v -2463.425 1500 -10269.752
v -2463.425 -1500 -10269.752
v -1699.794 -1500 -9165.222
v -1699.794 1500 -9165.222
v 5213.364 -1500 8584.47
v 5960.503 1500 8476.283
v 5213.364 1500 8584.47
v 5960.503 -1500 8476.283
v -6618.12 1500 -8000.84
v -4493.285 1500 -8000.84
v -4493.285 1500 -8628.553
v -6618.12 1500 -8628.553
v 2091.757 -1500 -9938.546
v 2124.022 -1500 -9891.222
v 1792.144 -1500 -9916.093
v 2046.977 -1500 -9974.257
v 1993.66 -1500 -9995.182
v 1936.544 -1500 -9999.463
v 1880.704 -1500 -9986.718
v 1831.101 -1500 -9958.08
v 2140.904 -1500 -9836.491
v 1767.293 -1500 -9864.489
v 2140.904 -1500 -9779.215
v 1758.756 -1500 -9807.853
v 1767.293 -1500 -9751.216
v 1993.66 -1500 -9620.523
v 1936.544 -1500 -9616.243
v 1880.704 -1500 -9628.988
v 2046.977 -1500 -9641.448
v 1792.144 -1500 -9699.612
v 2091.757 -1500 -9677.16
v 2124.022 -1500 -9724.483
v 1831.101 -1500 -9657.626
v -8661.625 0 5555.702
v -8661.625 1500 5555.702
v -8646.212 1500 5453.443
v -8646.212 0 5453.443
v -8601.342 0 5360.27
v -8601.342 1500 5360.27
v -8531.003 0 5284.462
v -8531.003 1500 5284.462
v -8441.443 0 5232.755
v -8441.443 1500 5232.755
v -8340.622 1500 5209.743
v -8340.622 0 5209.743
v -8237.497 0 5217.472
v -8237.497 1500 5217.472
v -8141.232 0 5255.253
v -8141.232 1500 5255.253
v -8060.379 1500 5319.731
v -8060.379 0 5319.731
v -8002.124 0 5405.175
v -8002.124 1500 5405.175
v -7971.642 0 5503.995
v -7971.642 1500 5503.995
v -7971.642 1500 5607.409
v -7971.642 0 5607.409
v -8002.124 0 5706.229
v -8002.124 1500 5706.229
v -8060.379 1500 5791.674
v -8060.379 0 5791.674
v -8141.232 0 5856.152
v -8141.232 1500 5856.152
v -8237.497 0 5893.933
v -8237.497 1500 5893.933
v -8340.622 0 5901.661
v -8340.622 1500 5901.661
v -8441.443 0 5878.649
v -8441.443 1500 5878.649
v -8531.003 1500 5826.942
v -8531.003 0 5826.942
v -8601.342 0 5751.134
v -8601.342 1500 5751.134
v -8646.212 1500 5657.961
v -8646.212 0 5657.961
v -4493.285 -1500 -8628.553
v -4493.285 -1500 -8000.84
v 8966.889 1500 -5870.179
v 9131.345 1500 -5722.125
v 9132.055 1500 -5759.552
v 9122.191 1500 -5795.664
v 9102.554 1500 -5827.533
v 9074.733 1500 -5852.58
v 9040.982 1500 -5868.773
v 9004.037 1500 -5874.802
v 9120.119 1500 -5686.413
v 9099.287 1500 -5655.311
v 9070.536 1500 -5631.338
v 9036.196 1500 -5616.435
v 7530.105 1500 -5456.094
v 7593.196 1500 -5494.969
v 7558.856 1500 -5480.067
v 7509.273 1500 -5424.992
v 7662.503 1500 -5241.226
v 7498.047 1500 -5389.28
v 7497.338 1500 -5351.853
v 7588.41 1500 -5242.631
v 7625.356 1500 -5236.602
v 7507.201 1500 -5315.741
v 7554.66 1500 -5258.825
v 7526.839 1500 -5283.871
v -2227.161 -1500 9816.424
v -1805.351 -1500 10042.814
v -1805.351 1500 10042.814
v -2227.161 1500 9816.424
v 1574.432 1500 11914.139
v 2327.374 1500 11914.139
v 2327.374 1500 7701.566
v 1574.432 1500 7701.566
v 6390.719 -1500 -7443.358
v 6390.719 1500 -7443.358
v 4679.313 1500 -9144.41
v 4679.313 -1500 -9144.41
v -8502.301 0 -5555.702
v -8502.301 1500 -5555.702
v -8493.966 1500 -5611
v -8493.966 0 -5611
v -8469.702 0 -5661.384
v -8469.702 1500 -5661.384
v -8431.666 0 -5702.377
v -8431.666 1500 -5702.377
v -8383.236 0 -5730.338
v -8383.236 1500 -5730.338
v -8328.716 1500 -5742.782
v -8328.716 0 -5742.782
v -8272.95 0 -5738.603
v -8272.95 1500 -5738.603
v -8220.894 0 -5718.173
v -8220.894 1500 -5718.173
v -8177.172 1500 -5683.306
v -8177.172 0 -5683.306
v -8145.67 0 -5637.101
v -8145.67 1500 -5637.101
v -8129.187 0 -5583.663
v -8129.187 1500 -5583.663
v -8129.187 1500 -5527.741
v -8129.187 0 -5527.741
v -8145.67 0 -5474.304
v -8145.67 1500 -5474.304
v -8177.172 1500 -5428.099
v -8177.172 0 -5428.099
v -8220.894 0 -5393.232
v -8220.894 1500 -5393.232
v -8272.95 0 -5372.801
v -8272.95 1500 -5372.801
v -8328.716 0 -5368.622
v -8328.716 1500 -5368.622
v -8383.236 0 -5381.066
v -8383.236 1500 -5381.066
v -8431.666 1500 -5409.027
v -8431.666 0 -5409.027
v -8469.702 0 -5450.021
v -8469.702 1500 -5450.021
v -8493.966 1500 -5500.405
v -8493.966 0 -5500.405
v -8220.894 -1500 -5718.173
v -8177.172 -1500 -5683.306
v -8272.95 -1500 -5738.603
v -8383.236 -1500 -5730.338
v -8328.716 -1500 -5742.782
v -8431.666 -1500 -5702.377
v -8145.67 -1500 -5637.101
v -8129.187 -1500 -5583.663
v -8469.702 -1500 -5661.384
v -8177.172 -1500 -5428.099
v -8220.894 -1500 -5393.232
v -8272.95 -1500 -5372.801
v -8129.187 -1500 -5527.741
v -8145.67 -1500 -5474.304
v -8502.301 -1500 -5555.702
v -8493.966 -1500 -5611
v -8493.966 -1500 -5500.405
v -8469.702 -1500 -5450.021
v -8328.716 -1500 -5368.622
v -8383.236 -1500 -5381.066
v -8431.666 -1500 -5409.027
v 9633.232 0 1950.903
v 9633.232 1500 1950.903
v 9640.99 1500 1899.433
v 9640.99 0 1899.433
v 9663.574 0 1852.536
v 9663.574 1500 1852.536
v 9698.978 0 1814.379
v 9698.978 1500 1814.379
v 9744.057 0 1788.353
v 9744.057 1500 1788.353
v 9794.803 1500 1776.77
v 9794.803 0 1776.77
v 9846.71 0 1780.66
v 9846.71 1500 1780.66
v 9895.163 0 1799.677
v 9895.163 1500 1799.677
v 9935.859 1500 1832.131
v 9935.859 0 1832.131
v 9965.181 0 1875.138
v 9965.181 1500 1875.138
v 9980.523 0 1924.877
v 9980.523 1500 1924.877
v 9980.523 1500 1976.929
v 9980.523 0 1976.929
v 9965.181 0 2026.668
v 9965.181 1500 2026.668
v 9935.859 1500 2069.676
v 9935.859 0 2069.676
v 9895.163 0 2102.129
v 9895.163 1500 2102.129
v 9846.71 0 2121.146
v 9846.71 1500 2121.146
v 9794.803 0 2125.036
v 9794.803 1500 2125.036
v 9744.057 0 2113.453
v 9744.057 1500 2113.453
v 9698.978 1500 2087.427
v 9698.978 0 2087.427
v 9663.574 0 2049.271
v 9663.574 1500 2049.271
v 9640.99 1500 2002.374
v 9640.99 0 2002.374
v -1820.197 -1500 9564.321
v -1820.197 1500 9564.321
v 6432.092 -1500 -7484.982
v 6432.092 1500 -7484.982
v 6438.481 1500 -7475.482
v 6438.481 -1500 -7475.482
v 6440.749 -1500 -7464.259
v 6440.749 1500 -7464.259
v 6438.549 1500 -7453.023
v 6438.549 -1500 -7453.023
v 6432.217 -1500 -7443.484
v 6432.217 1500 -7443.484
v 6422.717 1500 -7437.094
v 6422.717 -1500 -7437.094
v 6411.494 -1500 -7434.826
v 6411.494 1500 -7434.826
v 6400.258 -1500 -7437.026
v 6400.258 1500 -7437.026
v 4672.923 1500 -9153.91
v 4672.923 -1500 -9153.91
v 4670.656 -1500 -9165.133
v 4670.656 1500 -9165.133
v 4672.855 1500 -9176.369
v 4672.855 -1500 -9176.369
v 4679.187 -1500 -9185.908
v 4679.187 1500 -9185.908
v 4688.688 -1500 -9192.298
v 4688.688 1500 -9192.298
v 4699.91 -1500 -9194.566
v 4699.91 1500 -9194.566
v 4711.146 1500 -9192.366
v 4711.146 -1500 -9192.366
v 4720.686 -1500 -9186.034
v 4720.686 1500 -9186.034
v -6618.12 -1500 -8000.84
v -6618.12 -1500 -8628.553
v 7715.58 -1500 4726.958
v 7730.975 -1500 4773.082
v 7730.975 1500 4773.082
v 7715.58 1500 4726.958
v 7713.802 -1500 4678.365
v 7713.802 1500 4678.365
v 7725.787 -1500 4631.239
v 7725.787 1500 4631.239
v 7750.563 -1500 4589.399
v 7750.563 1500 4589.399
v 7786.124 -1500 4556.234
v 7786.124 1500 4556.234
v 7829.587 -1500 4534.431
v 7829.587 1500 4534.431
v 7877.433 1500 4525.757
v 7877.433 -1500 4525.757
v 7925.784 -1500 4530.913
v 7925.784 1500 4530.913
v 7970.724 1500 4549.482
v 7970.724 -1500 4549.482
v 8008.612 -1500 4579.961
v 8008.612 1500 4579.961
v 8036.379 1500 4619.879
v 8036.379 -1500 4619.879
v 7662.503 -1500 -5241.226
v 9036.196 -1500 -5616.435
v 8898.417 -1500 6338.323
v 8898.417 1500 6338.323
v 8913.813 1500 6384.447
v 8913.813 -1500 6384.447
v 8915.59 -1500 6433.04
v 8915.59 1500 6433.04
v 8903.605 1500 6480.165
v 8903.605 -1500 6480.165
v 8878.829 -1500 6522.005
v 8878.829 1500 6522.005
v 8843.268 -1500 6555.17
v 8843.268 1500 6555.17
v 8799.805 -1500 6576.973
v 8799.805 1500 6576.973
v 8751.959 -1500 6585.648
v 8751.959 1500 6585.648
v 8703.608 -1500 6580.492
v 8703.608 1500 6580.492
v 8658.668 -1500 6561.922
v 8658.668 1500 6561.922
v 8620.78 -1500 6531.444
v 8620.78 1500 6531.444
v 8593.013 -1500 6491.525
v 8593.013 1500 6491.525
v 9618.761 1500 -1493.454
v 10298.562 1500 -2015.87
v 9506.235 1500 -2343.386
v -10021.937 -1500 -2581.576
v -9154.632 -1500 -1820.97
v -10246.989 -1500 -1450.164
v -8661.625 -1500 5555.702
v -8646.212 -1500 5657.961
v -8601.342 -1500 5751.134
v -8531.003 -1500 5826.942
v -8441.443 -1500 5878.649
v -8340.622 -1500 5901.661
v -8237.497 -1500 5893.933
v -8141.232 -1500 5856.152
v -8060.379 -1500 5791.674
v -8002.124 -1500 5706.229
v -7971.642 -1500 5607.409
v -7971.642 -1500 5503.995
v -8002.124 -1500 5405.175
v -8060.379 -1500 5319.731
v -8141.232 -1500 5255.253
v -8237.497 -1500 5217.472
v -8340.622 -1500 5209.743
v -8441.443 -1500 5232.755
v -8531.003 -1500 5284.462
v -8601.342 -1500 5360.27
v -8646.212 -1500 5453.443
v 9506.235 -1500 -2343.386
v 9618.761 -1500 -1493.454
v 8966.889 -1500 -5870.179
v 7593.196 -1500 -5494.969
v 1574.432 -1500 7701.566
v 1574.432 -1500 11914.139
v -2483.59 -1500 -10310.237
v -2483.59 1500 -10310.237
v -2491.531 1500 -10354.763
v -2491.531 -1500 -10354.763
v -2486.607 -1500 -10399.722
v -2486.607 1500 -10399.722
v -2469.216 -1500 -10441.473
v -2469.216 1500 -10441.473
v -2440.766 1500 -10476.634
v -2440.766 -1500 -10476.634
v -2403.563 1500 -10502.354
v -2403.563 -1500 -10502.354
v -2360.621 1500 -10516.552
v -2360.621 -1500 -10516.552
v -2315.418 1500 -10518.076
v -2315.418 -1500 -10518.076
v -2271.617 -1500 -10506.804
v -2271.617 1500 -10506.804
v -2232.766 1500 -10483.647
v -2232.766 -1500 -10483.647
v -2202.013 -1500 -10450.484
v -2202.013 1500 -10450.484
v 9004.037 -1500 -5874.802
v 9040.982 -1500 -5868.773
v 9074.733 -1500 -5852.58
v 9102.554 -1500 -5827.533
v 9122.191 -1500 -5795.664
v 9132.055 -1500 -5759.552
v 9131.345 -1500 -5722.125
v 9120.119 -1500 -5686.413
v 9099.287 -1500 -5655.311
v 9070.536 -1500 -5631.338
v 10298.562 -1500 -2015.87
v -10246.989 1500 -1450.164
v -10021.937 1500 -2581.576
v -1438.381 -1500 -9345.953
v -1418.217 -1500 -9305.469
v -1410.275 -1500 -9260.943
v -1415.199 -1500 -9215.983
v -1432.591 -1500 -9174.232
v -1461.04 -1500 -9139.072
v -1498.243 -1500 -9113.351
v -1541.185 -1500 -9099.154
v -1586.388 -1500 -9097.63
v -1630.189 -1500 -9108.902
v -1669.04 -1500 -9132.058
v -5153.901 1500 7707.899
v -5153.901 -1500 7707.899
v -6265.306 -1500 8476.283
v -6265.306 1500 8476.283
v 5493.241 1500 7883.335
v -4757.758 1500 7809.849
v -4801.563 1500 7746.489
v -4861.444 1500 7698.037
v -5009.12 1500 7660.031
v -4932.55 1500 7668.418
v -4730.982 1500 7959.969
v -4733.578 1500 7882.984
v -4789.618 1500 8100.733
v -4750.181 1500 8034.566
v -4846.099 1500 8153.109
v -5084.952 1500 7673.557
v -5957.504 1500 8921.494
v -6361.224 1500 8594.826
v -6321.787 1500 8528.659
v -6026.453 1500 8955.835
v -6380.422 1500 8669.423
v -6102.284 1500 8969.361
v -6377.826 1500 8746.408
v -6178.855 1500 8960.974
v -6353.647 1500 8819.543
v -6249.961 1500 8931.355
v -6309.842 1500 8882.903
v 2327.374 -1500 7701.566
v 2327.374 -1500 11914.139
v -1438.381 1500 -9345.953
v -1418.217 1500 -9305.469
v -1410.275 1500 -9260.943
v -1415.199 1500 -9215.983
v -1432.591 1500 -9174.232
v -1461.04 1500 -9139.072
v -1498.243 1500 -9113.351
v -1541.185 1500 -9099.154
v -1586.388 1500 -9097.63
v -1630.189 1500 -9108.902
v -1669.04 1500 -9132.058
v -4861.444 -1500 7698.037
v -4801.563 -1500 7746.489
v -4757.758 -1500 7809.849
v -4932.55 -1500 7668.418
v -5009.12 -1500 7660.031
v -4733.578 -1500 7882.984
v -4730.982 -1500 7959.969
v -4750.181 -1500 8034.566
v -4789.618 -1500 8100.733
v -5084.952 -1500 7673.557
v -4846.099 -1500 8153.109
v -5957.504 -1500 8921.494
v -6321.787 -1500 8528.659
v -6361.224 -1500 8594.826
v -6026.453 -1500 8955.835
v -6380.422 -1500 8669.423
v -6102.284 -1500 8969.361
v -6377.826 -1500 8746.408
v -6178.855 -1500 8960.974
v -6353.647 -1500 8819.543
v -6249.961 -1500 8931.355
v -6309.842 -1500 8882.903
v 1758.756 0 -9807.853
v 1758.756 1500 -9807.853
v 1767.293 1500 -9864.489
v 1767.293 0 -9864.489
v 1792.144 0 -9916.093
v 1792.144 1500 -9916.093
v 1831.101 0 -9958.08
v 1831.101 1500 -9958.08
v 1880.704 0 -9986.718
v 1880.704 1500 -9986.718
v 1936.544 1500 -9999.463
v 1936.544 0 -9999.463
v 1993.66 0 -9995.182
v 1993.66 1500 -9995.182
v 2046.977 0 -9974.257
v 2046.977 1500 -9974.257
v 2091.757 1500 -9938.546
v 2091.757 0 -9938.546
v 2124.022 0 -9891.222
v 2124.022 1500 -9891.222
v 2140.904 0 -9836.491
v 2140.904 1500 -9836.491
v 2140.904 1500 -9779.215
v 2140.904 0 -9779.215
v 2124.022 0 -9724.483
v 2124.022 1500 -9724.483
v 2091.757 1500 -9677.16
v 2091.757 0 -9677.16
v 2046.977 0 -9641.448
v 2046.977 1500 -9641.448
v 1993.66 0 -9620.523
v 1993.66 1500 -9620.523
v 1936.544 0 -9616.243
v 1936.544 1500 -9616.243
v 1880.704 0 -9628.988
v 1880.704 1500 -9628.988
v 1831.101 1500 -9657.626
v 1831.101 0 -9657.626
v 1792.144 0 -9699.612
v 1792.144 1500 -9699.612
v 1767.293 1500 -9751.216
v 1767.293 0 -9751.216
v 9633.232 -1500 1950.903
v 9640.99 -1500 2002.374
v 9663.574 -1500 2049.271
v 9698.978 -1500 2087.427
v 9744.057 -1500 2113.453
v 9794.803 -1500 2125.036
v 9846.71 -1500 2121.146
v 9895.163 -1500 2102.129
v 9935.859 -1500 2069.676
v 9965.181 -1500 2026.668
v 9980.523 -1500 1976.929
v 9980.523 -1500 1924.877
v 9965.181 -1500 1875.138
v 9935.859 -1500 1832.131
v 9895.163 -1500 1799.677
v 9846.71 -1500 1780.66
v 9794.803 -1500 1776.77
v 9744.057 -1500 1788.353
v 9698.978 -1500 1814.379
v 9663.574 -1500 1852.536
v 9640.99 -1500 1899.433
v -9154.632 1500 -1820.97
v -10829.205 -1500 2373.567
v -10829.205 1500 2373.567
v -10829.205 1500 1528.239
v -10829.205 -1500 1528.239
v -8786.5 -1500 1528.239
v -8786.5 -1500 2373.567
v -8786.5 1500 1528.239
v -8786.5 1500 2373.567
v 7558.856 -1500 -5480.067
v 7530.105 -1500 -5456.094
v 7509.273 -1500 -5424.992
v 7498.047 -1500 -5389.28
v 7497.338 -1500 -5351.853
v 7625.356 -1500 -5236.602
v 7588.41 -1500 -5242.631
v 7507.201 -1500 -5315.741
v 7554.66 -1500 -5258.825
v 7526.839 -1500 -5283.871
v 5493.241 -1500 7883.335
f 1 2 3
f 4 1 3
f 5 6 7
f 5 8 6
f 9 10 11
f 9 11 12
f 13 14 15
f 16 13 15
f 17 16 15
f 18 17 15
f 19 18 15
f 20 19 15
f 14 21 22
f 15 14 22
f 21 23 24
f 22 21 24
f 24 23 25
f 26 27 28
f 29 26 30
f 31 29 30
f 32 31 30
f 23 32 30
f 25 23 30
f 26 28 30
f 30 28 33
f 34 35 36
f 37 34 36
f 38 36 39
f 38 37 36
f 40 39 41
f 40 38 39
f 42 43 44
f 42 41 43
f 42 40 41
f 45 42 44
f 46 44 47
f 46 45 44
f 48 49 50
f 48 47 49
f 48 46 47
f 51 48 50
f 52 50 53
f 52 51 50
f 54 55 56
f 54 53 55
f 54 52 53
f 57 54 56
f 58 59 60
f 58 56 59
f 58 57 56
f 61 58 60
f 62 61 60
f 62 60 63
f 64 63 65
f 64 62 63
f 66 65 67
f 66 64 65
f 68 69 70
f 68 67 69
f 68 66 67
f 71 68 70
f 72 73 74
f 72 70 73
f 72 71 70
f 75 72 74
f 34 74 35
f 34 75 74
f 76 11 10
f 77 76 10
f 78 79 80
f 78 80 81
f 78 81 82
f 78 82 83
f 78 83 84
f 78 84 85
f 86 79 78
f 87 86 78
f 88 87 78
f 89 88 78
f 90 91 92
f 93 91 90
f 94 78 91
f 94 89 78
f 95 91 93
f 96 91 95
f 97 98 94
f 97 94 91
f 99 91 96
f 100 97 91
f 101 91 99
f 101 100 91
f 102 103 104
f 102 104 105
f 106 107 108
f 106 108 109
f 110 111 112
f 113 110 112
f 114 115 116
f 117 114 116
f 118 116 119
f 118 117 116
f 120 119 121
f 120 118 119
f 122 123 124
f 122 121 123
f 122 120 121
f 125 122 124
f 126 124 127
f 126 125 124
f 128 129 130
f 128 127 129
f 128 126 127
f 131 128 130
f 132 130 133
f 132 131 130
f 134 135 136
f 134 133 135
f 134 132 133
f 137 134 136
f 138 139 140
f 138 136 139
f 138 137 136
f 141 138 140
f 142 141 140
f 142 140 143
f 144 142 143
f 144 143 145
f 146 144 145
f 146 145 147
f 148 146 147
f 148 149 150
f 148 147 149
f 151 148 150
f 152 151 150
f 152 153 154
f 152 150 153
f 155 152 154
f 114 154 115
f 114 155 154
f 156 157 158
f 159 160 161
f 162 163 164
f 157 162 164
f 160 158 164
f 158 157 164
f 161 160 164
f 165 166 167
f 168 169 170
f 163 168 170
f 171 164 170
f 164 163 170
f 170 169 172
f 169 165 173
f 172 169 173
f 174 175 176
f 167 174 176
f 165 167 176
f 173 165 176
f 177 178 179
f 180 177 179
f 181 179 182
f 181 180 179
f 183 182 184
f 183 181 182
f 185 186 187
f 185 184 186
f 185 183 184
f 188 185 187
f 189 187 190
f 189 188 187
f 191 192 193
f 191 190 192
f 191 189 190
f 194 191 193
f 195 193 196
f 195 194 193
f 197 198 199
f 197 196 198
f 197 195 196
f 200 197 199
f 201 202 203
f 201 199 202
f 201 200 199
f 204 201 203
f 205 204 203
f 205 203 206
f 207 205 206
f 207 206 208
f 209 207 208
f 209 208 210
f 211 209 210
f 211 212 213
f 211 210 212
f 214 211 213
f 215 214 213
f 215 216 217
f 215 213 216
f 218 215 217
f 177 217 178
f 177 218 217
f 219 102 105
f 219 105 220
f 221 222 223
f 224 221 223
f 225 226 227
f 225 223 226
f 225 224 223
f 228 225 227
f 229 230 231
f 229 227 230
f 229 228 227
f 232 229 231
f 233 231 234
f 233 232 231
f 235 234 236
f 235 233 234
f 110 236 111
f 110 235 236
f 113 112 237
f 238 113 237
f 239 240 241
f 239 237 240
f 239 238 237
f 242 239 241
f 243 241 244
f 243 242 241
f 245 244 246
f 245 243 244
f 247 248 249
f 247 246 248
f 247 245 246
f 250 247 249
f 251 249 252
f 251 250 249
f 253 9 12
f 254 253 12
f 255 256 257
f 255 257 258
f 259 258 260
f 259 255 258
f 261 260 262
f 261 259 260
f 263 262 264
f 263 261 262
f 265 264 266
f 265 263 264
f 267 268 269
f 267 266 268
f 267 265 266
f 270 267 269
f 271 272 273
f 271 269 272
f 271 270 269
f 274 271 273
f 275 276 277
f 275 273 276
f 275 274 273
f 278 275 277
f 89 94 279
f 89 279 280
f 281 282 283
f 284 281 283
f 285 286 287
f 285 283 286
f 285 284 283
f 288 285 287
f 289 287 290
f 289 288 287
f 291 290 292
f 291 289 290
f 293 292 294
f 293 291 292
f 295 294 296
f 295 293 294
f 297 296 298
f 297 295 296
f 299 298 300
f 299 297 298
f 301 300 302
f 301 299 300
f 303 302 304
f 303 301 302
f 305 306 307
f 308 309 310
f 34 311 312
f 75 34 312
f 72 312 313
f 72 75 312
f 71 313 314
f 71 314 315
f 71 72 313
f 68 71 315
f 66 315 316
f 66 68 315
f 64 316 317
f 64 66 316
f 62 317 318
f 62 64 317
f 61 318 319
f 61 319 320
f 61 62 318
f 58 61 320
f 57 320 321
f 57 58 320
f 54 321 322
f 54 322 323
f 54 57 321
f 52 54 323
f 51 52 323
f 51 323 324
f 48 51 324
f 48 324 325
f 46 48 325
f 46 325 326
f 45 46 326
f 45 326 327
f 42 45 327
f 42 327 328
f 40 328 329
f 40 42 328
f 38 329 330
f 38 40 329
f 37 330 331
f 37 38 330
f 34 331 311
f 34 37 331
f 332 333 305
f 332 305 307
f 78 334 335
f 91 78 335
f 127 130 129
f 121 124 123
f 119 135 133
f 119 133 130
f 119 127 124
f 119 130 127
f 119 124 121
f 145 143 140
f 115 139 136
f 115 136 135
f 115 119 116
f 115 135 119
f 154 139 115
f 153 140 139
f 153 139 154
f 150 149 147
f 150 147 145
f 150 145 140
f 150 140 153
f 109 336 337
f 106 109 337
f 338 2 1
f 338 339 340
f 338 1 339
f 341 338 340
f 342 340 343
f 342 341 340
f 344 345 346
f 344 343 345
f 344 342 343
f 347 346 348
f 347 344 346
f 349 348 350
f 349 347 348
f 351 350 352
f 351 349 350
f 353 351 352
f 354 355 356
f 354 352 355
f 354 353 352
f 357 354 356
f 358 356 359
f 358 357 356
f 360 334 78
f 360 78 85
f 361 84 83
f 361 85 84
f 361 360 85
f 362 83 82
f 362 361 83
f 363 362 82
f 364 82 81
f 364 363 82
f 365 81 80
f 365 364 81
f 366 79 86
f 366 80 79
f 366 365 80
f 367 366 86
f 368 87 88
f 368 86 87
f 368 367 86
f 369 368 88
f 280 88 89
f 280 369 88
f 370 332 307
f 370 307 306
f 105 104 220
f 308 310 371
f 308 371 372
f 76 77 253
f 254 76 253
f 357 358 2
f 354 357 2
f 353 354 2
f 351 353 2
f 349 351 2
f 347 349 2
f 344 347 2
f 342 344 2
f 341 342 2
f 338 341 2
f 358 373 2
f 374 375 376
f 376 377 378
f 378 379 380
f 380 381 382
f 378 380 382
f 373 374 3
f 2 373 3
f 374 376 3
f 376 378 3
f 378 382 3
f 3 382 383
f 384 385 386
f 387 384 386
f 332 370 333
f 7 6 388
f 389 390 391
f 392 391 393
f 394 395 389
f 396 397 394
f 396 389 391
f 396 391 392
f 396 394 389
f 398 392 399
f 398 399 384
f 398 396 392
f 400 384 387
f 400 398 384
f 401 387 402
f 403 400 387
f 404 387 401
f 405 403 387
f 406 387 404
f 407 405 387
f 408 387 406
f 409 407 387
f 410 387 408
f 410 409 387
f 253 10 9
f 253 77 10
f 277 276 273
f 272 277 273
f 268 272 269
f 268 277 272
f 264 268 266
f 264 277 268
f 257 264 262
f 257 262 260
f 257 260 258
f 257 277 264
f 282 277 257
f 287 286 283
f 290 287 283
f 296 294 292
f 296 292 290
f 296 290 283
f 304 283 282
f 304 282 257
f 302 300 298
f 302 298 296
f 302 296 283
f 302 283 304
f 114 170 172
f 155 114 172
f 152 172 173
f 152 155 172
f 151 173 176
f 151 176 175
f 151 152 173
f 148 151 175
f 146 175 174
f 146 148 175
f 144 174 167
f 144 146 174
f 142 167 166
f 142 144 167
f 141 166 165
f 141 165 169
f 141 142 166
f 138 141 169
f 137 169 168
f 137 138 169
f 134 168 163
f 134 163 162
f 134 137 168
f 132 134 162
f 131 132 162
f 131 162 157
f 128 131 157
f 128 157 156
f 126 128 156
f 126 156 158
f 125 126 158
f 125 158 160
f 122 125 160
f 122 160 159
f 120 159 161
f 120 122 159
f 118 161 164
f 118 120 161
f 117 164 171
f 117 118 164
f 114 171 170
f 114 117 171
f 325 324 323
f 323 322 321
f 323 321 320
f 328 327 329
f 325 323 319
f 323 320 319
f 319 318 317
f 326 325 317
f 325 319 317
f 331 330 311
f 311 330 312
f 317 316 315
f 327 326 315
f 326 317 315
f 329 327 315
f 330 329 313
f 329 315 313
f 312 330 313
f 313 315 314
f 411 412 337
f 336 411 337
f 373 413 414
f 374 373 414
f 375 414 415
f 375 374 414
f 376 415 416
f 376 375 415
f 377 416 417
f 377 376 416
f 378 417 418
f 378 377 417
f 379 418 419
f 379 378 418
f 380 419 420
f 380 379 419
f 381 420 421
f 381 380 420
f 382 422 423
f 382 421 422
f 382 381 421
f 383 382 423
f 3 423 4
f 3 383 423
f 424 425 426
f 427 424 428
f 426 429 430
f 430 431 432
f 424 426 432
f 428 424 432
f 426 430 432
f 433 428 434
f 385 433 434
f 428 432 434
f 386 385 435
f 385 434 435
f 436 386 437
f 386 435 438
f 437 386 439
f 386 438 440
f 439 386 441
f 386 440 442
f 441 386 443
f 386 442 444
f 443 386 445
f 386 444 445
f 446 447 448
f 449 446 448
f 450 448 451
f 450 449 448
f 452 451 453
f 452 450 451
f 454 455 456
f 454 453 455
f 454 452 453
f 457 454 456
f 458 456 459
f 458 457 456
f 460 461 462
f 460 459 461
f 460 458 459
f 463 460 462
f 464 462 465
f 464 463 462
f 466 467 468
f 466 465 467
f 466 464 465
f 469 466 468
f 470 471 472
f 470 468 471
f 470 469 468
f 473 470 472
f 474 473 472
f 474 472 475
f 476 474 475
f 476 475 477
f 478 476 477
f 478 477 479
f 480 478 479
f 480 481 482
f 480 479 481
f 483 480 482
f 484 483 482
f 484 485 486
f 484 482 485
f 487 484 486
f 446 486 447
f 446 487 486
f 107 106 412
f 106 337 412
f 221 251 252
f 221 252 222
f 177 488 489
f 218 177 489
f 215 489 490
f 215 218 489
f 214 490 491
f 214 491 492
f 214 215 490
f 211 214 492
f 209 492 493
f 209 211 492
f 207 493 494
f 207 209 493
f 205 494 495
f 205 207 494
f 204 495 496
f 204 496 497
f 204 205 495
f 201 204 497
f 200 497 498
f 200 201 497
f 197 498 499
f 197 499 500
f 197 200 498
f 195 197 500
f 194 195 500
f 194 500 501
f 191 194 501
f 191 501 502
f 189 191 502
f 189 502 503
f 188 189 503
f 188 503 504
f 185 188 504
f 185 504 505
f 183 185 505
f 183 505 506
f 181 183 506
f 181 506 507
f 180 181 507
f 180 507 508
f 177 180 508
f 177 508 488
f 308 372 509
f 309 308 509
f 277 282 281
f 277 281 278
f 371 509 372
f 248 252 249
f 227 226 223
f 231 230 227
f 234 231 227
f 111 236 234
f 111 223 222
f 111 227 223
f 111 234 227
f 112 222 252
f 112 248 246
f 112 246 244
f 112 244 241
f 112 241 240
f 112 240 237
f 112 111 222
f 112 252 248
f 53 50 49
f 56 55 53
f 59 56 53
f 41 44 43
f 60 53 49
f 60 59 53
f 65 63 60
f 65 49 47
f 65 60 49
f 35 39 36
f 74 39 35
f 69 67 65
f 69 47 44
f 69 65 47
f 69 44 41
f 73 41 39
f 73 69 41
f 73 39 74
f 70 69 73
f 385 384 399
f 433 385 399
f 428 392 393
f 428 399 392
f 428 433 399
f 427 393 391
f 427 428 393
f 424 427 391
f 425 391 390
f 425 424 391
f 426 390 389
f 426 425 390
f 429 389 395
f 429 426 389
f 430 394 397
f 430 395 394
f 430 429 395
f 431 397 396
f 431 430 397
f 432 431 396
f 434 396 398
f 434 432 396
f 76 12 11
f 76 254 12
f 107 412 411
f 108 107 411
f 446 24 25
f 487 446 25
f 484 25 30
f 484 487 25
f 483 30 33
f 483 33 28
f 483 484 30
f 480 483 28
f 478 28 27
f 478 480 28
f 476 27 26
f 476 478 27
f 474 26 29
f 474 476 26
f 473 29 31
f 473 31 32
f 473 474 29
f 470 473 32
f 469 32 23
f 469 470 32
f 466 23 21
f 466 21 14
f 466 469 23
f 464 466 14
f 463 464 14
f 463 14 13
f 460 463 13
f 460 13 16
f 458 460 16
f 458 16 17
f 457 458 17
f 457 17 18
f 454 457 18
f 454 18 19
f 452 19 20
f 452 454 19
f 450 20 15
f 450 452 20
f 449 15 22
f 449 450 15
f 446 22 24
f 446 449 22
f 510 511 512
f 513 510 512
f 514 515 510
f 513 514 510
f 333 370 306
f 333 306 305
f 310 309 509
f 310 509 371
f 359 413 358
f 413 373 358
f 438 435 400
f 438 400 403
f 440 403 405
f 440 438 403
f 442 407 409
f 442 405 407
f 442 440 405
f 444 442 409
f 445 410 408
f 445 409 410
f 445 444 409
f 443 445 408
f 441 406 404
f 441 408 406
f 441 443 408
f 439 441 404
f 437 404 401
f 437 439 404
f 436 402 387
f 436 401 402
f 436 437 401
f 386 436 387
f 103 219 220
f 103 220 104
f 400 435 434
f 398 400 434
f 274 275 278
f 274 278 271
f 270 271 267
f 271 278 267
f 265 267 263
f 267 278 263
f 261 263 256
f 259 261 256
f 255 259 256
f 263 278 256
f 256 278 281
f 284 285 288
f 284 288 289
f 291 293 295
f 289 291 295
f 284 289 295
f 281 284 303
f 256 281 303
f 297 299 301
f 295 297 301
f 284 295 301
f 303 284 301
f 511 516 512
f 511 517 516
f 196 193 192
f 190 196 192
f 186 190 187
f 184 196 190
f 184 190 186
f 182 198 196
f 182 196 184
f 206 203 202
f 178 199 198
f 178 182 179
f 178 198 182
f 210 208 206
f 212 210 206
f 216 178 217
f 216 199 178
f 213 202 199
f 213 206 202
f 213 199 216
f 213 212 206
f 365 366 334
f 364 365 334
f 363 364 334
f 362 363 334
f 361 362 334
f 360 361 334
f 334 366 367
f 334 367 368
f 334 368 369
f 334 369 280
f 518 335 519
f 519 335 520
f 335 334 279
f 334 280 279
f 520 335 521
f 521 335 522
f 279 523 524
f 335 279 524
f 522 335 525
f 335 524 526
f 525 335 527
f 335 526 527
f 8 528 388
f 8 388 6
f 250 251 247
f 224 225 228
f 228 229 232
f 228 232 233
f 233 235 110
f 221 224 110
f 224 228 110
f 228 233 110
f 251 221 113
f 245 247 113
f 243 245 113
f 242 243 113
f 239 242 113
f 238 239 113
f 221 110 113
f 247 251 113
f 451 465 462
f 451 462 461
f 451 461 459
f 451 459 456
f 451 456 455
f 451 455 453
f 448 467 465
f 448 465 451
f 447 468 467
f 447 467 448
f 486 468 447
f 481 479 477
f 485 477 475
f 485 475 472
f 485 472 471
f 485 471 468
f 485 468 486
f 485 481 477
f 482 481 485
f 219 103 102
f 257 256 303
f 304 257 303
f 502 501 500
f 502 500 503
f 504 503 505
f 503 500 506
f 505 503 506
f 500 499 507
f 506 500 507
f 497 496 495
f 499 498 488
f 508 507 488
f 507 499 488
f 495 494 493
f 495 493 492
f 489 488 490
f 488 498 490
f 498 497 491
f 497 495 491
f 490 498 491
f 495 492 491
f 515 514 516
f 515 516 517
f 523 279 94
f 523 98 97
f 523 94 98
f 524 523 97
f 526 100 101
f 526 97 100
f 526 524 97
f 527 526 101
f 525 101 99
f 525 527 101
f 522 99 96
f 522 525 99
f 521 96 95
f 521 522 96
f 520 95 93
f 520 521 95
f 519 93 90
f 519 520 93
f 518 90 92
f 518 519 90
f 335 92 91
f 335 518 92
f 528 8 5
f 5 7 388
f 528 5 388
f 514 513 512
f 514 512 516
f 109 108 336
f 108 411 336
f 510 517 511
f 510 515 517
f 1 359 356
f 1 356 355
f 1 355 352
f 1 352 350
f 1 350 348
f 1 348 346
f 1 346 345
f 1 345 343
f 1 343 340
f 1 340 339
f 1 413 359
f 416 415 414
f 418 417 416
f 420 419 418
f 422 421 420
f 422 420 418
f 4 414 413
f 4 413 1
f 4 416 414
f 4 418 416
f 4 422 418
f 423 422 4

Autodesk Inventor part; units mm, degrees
ref_plane "YZ Plane" through (0, 0, 0) normal (1, 0, 0) x (0, 1, 0)
ref_plane "XZ Plane" through (0, 0, 0) normal (0, 1, 0) x (-1, 0, 0)
ref_plane "XY Plane" through (0, 0, 0) normal (0, 0, 1) x (1, 0, 0)
sketch "Sketch1" plane through (0, 0, 0) normal (0, 1, 0) x (-1, 0, 0)
  circle A0 centre (0, 0) radius 10000 construction
  line L0 (0, 0) -> (10000, 0)
  line L1 (0, 0) -> (9807.8528, -1950.9032) construction
  circle A1 centre (8314.6961, 5555.7023) radius 346.929
  circle A2 centre (8314.6961, -5555.7023) radius 187.6046
  circle A3 centre (-9807.8528, 1950.9032) radius 174.621
  circle A4 centre (-1950.9032, -9807.8528) radius 192.1472
  line L2 (10829.2054, 1528.2394) -> (8786.5002, 1528.2394)
  line L3 (8786.5002, 1528.2394) -> (8786.5002, 2373.5671)
  line L4 (8786.5002, 2373.5671) -> (10829.2054, 2373.5671)
  line L5 (10829.2054, 2373.5671) -> (10829.2054, 1528.2394)
  line L6 (10829.2054, 1528.2394) -> (8786.5002, 2373.5671) construction
  line L7 (8786.5002, 1528.2394) -> (10829.2054, 2373.5671) construction
  line L8 (6618.1197, -8628.5526) -> (4493.285, -8628.5526)
  line L9 (4493.285, -8628.5526) -> (4493.285, -8000.8397)
  line L10 (4493.285, -8000.8397) -> (6618.1197, -8000.8397)
  line L11 (6618.1197, -8000.8397) -> (6618.1197, -8628.5526)
  line L12 (6618.1197, -8628.5526) -> (4493.285, -8000.8397) construction
  line L13 (4493.285, -8628.5526) -> (6618.1197, -8000.8397) construction
  line L14 (-1574.432, 11914.1393) -> (-2327.3745, 11914.1393)
  line L15 (-2327.3745, 11914.1393) -> (-2327.3745, 7701.5663)
  line L16 (-2327.3745, 7701.5663) -> (-1574.432, 7701.5663)
  line L17 (-1574.432, 7701.5663) -> (-1574.432, 11914.1393)
  line L18 (-1574.432, 11914.1393) -> (-2327.3745, 7701.5663) construction
  line L19 (-2327.3745, 11914.1393) -> (-1574.432, 7701.5663) construction
  line L20 (6111.4047, 8698.8883) -> (5000, 7930.504) construction
  line L21 (5957.5036, 8921.4935) -> (4846.0989, 8153.1092)
  line L22 (5153.9011, 7707.8988) -> (6265.3057, 8476.283)
  arc A5 (6265.3057, 8476.283) -> (5957.5036, 8921.4935) centre (6111.4047, 8698.8883) ccw
  arc A6 (4846.0989, 8153.1092) -> (5153.9011, 7707.8988) centre (5000, 7930.504) ccw
  line L23 (1569.0875, -9255.5877) -> (2332.719, -10360.1179) construction
  line L24 (1438.3811, -9345.9533) -> (2202.0126, -10450.4835)
  line L25 (2463.4253, -10269.7523) -> (1699.7938, -9165.2221)
  arc A7 (1699.7938, -9165.2221) -> (1438.3811, -9345.9533) centre (1569.0875, -9255.5877) ccw
  arc A8 (2202.0126, -10450.4835) -> (2463.4253, -10269.7523) centre (2332.719, -10360.1179) ccw
  line L26 (-6411.4053, -7464.1701) -> (-4699.9994, -9165.2221) construction
  line L27 (-6390.7191, -7443.358) -> (-4679.3132, -9144.41)
  line L28 (-4720.6856, -9186.0343) -> (-6432.0915, -7484.9822)
  arc A9 (-6390.7191, -7443.358) -> (-6432.0915, -7484.9822) centre (-6411.4053, -7464.1701) ccw
  arc A10 (-4720.6856, -9186.0343) -> (-4679.3132, -9144.41) centre (-4699.9994, -9165.2221) ccw
  line L29 (-7627.8496, -5368.0977) -> (-9001.5427, -5743.3069) construction
  line L30 (-7662.5032, -5241.2261) -> (-9036.1963, -5616.4353)
  line L31 (-8966.8891, -5870.1786) -> (-7593.196, -5494.9694)
  arc A11 (-7593.196, -5494.9694) -> (-7662.5032, -5241.2261) centre (-7627.8496, -5368.0977) ccw
  arc A12 (-9036.1963, -5616.4353) -> (-8966.8891, -5870.1786) centre (-9001.5427, -5743.3069) ccw
  line L32 (-8745.7152, 6414.9242) -> (-7883.677, 4696.4804) construction
  line L33 (-8898.4171, 6338.323) -> (-8036.3789, 4619.8792)
  line L34 (-7730.9752, 4773.0816) -> (-8593.0134, 6491.5254)
  arc A13 (-8593.0134, 6491.5254) -> (-8898.4171, 6338.323) centre (-8745.7152, 6414.9242) ccw
  arc A14 (-8036.3789, 4619.8792) -> (-7730.9752, 4773.0816) centre (-7883.677, 4696.4804) ccw
  line L35 (1820.1969, 9564.3207) -> (1805.3514, 10042.8139)
  line L36 (1805.3514, 10042.8139) -> (2227.1614, 9816.4238)
  line L37 (2227.1614, 9816.4238) -> (1820.1969, 9564.3207)
  line L38 (9154.6321, -1820.9695) -> (10246.989, -1450.1643)
  line L39 (10246.989, -1450.1643) -> (10021.9373, -2581.5758)
  line L40 (10021.9373, -2581.5758) -> (9154.6321, -1820.9695)
  line L41 (-5960.5026, 8476.283) -> (-5213.3638, 8584.47)
  line L42 (-5213.3638, 8584.47) -> (-5493.2406, 7883.3354)
  line L43 (-5493.2406, 7883.3354) -> (-5960.5026, 8476.283)
  line L44 (-10298.5617, -2015.8701) -> (-9618.7613, -1493.4535)
  line L45 (-9618.7613, -1493.4535) -> (-9506.2354, -2343.3861)
  line L46 (-9506.2354, -2343.3861) -> (-10298.5617, -2015.8701)
  point P0 (9807.8528, 1950.9032)
  point P1 (5555.7023, 8314.6961)
  point P2 (1950.9032, 9807.8528)
  point P3 (-1950.9032, 9807.8528)
  point P4 (-5555.7023, 8314.6961)
  point P5 (-8314.6961, 5555.7023)
  point P6 (-9807.8528, -1950.9032)
  point P7 (-8314.6961, -5555.7023)
  point P8 (-5555.7023, -8314.6961)
  point P9 (1950.9032, -9807.8528)
  point P10 (5555.7023, -8314.6961)
  point P11 (1950.9032, 9807.8528)
  point P12 (-5555.7023, 8314.6961)
  point P13 (-9807.8528, -1950.9032)
  dimension "d0" = 20000
  dimension "d1" = 11.25
  dimension "d4" = 360
extrude "Extrusion1" add sketch "Sketch1" along normal mid plane 3000
properties part number "simple_ring2"
